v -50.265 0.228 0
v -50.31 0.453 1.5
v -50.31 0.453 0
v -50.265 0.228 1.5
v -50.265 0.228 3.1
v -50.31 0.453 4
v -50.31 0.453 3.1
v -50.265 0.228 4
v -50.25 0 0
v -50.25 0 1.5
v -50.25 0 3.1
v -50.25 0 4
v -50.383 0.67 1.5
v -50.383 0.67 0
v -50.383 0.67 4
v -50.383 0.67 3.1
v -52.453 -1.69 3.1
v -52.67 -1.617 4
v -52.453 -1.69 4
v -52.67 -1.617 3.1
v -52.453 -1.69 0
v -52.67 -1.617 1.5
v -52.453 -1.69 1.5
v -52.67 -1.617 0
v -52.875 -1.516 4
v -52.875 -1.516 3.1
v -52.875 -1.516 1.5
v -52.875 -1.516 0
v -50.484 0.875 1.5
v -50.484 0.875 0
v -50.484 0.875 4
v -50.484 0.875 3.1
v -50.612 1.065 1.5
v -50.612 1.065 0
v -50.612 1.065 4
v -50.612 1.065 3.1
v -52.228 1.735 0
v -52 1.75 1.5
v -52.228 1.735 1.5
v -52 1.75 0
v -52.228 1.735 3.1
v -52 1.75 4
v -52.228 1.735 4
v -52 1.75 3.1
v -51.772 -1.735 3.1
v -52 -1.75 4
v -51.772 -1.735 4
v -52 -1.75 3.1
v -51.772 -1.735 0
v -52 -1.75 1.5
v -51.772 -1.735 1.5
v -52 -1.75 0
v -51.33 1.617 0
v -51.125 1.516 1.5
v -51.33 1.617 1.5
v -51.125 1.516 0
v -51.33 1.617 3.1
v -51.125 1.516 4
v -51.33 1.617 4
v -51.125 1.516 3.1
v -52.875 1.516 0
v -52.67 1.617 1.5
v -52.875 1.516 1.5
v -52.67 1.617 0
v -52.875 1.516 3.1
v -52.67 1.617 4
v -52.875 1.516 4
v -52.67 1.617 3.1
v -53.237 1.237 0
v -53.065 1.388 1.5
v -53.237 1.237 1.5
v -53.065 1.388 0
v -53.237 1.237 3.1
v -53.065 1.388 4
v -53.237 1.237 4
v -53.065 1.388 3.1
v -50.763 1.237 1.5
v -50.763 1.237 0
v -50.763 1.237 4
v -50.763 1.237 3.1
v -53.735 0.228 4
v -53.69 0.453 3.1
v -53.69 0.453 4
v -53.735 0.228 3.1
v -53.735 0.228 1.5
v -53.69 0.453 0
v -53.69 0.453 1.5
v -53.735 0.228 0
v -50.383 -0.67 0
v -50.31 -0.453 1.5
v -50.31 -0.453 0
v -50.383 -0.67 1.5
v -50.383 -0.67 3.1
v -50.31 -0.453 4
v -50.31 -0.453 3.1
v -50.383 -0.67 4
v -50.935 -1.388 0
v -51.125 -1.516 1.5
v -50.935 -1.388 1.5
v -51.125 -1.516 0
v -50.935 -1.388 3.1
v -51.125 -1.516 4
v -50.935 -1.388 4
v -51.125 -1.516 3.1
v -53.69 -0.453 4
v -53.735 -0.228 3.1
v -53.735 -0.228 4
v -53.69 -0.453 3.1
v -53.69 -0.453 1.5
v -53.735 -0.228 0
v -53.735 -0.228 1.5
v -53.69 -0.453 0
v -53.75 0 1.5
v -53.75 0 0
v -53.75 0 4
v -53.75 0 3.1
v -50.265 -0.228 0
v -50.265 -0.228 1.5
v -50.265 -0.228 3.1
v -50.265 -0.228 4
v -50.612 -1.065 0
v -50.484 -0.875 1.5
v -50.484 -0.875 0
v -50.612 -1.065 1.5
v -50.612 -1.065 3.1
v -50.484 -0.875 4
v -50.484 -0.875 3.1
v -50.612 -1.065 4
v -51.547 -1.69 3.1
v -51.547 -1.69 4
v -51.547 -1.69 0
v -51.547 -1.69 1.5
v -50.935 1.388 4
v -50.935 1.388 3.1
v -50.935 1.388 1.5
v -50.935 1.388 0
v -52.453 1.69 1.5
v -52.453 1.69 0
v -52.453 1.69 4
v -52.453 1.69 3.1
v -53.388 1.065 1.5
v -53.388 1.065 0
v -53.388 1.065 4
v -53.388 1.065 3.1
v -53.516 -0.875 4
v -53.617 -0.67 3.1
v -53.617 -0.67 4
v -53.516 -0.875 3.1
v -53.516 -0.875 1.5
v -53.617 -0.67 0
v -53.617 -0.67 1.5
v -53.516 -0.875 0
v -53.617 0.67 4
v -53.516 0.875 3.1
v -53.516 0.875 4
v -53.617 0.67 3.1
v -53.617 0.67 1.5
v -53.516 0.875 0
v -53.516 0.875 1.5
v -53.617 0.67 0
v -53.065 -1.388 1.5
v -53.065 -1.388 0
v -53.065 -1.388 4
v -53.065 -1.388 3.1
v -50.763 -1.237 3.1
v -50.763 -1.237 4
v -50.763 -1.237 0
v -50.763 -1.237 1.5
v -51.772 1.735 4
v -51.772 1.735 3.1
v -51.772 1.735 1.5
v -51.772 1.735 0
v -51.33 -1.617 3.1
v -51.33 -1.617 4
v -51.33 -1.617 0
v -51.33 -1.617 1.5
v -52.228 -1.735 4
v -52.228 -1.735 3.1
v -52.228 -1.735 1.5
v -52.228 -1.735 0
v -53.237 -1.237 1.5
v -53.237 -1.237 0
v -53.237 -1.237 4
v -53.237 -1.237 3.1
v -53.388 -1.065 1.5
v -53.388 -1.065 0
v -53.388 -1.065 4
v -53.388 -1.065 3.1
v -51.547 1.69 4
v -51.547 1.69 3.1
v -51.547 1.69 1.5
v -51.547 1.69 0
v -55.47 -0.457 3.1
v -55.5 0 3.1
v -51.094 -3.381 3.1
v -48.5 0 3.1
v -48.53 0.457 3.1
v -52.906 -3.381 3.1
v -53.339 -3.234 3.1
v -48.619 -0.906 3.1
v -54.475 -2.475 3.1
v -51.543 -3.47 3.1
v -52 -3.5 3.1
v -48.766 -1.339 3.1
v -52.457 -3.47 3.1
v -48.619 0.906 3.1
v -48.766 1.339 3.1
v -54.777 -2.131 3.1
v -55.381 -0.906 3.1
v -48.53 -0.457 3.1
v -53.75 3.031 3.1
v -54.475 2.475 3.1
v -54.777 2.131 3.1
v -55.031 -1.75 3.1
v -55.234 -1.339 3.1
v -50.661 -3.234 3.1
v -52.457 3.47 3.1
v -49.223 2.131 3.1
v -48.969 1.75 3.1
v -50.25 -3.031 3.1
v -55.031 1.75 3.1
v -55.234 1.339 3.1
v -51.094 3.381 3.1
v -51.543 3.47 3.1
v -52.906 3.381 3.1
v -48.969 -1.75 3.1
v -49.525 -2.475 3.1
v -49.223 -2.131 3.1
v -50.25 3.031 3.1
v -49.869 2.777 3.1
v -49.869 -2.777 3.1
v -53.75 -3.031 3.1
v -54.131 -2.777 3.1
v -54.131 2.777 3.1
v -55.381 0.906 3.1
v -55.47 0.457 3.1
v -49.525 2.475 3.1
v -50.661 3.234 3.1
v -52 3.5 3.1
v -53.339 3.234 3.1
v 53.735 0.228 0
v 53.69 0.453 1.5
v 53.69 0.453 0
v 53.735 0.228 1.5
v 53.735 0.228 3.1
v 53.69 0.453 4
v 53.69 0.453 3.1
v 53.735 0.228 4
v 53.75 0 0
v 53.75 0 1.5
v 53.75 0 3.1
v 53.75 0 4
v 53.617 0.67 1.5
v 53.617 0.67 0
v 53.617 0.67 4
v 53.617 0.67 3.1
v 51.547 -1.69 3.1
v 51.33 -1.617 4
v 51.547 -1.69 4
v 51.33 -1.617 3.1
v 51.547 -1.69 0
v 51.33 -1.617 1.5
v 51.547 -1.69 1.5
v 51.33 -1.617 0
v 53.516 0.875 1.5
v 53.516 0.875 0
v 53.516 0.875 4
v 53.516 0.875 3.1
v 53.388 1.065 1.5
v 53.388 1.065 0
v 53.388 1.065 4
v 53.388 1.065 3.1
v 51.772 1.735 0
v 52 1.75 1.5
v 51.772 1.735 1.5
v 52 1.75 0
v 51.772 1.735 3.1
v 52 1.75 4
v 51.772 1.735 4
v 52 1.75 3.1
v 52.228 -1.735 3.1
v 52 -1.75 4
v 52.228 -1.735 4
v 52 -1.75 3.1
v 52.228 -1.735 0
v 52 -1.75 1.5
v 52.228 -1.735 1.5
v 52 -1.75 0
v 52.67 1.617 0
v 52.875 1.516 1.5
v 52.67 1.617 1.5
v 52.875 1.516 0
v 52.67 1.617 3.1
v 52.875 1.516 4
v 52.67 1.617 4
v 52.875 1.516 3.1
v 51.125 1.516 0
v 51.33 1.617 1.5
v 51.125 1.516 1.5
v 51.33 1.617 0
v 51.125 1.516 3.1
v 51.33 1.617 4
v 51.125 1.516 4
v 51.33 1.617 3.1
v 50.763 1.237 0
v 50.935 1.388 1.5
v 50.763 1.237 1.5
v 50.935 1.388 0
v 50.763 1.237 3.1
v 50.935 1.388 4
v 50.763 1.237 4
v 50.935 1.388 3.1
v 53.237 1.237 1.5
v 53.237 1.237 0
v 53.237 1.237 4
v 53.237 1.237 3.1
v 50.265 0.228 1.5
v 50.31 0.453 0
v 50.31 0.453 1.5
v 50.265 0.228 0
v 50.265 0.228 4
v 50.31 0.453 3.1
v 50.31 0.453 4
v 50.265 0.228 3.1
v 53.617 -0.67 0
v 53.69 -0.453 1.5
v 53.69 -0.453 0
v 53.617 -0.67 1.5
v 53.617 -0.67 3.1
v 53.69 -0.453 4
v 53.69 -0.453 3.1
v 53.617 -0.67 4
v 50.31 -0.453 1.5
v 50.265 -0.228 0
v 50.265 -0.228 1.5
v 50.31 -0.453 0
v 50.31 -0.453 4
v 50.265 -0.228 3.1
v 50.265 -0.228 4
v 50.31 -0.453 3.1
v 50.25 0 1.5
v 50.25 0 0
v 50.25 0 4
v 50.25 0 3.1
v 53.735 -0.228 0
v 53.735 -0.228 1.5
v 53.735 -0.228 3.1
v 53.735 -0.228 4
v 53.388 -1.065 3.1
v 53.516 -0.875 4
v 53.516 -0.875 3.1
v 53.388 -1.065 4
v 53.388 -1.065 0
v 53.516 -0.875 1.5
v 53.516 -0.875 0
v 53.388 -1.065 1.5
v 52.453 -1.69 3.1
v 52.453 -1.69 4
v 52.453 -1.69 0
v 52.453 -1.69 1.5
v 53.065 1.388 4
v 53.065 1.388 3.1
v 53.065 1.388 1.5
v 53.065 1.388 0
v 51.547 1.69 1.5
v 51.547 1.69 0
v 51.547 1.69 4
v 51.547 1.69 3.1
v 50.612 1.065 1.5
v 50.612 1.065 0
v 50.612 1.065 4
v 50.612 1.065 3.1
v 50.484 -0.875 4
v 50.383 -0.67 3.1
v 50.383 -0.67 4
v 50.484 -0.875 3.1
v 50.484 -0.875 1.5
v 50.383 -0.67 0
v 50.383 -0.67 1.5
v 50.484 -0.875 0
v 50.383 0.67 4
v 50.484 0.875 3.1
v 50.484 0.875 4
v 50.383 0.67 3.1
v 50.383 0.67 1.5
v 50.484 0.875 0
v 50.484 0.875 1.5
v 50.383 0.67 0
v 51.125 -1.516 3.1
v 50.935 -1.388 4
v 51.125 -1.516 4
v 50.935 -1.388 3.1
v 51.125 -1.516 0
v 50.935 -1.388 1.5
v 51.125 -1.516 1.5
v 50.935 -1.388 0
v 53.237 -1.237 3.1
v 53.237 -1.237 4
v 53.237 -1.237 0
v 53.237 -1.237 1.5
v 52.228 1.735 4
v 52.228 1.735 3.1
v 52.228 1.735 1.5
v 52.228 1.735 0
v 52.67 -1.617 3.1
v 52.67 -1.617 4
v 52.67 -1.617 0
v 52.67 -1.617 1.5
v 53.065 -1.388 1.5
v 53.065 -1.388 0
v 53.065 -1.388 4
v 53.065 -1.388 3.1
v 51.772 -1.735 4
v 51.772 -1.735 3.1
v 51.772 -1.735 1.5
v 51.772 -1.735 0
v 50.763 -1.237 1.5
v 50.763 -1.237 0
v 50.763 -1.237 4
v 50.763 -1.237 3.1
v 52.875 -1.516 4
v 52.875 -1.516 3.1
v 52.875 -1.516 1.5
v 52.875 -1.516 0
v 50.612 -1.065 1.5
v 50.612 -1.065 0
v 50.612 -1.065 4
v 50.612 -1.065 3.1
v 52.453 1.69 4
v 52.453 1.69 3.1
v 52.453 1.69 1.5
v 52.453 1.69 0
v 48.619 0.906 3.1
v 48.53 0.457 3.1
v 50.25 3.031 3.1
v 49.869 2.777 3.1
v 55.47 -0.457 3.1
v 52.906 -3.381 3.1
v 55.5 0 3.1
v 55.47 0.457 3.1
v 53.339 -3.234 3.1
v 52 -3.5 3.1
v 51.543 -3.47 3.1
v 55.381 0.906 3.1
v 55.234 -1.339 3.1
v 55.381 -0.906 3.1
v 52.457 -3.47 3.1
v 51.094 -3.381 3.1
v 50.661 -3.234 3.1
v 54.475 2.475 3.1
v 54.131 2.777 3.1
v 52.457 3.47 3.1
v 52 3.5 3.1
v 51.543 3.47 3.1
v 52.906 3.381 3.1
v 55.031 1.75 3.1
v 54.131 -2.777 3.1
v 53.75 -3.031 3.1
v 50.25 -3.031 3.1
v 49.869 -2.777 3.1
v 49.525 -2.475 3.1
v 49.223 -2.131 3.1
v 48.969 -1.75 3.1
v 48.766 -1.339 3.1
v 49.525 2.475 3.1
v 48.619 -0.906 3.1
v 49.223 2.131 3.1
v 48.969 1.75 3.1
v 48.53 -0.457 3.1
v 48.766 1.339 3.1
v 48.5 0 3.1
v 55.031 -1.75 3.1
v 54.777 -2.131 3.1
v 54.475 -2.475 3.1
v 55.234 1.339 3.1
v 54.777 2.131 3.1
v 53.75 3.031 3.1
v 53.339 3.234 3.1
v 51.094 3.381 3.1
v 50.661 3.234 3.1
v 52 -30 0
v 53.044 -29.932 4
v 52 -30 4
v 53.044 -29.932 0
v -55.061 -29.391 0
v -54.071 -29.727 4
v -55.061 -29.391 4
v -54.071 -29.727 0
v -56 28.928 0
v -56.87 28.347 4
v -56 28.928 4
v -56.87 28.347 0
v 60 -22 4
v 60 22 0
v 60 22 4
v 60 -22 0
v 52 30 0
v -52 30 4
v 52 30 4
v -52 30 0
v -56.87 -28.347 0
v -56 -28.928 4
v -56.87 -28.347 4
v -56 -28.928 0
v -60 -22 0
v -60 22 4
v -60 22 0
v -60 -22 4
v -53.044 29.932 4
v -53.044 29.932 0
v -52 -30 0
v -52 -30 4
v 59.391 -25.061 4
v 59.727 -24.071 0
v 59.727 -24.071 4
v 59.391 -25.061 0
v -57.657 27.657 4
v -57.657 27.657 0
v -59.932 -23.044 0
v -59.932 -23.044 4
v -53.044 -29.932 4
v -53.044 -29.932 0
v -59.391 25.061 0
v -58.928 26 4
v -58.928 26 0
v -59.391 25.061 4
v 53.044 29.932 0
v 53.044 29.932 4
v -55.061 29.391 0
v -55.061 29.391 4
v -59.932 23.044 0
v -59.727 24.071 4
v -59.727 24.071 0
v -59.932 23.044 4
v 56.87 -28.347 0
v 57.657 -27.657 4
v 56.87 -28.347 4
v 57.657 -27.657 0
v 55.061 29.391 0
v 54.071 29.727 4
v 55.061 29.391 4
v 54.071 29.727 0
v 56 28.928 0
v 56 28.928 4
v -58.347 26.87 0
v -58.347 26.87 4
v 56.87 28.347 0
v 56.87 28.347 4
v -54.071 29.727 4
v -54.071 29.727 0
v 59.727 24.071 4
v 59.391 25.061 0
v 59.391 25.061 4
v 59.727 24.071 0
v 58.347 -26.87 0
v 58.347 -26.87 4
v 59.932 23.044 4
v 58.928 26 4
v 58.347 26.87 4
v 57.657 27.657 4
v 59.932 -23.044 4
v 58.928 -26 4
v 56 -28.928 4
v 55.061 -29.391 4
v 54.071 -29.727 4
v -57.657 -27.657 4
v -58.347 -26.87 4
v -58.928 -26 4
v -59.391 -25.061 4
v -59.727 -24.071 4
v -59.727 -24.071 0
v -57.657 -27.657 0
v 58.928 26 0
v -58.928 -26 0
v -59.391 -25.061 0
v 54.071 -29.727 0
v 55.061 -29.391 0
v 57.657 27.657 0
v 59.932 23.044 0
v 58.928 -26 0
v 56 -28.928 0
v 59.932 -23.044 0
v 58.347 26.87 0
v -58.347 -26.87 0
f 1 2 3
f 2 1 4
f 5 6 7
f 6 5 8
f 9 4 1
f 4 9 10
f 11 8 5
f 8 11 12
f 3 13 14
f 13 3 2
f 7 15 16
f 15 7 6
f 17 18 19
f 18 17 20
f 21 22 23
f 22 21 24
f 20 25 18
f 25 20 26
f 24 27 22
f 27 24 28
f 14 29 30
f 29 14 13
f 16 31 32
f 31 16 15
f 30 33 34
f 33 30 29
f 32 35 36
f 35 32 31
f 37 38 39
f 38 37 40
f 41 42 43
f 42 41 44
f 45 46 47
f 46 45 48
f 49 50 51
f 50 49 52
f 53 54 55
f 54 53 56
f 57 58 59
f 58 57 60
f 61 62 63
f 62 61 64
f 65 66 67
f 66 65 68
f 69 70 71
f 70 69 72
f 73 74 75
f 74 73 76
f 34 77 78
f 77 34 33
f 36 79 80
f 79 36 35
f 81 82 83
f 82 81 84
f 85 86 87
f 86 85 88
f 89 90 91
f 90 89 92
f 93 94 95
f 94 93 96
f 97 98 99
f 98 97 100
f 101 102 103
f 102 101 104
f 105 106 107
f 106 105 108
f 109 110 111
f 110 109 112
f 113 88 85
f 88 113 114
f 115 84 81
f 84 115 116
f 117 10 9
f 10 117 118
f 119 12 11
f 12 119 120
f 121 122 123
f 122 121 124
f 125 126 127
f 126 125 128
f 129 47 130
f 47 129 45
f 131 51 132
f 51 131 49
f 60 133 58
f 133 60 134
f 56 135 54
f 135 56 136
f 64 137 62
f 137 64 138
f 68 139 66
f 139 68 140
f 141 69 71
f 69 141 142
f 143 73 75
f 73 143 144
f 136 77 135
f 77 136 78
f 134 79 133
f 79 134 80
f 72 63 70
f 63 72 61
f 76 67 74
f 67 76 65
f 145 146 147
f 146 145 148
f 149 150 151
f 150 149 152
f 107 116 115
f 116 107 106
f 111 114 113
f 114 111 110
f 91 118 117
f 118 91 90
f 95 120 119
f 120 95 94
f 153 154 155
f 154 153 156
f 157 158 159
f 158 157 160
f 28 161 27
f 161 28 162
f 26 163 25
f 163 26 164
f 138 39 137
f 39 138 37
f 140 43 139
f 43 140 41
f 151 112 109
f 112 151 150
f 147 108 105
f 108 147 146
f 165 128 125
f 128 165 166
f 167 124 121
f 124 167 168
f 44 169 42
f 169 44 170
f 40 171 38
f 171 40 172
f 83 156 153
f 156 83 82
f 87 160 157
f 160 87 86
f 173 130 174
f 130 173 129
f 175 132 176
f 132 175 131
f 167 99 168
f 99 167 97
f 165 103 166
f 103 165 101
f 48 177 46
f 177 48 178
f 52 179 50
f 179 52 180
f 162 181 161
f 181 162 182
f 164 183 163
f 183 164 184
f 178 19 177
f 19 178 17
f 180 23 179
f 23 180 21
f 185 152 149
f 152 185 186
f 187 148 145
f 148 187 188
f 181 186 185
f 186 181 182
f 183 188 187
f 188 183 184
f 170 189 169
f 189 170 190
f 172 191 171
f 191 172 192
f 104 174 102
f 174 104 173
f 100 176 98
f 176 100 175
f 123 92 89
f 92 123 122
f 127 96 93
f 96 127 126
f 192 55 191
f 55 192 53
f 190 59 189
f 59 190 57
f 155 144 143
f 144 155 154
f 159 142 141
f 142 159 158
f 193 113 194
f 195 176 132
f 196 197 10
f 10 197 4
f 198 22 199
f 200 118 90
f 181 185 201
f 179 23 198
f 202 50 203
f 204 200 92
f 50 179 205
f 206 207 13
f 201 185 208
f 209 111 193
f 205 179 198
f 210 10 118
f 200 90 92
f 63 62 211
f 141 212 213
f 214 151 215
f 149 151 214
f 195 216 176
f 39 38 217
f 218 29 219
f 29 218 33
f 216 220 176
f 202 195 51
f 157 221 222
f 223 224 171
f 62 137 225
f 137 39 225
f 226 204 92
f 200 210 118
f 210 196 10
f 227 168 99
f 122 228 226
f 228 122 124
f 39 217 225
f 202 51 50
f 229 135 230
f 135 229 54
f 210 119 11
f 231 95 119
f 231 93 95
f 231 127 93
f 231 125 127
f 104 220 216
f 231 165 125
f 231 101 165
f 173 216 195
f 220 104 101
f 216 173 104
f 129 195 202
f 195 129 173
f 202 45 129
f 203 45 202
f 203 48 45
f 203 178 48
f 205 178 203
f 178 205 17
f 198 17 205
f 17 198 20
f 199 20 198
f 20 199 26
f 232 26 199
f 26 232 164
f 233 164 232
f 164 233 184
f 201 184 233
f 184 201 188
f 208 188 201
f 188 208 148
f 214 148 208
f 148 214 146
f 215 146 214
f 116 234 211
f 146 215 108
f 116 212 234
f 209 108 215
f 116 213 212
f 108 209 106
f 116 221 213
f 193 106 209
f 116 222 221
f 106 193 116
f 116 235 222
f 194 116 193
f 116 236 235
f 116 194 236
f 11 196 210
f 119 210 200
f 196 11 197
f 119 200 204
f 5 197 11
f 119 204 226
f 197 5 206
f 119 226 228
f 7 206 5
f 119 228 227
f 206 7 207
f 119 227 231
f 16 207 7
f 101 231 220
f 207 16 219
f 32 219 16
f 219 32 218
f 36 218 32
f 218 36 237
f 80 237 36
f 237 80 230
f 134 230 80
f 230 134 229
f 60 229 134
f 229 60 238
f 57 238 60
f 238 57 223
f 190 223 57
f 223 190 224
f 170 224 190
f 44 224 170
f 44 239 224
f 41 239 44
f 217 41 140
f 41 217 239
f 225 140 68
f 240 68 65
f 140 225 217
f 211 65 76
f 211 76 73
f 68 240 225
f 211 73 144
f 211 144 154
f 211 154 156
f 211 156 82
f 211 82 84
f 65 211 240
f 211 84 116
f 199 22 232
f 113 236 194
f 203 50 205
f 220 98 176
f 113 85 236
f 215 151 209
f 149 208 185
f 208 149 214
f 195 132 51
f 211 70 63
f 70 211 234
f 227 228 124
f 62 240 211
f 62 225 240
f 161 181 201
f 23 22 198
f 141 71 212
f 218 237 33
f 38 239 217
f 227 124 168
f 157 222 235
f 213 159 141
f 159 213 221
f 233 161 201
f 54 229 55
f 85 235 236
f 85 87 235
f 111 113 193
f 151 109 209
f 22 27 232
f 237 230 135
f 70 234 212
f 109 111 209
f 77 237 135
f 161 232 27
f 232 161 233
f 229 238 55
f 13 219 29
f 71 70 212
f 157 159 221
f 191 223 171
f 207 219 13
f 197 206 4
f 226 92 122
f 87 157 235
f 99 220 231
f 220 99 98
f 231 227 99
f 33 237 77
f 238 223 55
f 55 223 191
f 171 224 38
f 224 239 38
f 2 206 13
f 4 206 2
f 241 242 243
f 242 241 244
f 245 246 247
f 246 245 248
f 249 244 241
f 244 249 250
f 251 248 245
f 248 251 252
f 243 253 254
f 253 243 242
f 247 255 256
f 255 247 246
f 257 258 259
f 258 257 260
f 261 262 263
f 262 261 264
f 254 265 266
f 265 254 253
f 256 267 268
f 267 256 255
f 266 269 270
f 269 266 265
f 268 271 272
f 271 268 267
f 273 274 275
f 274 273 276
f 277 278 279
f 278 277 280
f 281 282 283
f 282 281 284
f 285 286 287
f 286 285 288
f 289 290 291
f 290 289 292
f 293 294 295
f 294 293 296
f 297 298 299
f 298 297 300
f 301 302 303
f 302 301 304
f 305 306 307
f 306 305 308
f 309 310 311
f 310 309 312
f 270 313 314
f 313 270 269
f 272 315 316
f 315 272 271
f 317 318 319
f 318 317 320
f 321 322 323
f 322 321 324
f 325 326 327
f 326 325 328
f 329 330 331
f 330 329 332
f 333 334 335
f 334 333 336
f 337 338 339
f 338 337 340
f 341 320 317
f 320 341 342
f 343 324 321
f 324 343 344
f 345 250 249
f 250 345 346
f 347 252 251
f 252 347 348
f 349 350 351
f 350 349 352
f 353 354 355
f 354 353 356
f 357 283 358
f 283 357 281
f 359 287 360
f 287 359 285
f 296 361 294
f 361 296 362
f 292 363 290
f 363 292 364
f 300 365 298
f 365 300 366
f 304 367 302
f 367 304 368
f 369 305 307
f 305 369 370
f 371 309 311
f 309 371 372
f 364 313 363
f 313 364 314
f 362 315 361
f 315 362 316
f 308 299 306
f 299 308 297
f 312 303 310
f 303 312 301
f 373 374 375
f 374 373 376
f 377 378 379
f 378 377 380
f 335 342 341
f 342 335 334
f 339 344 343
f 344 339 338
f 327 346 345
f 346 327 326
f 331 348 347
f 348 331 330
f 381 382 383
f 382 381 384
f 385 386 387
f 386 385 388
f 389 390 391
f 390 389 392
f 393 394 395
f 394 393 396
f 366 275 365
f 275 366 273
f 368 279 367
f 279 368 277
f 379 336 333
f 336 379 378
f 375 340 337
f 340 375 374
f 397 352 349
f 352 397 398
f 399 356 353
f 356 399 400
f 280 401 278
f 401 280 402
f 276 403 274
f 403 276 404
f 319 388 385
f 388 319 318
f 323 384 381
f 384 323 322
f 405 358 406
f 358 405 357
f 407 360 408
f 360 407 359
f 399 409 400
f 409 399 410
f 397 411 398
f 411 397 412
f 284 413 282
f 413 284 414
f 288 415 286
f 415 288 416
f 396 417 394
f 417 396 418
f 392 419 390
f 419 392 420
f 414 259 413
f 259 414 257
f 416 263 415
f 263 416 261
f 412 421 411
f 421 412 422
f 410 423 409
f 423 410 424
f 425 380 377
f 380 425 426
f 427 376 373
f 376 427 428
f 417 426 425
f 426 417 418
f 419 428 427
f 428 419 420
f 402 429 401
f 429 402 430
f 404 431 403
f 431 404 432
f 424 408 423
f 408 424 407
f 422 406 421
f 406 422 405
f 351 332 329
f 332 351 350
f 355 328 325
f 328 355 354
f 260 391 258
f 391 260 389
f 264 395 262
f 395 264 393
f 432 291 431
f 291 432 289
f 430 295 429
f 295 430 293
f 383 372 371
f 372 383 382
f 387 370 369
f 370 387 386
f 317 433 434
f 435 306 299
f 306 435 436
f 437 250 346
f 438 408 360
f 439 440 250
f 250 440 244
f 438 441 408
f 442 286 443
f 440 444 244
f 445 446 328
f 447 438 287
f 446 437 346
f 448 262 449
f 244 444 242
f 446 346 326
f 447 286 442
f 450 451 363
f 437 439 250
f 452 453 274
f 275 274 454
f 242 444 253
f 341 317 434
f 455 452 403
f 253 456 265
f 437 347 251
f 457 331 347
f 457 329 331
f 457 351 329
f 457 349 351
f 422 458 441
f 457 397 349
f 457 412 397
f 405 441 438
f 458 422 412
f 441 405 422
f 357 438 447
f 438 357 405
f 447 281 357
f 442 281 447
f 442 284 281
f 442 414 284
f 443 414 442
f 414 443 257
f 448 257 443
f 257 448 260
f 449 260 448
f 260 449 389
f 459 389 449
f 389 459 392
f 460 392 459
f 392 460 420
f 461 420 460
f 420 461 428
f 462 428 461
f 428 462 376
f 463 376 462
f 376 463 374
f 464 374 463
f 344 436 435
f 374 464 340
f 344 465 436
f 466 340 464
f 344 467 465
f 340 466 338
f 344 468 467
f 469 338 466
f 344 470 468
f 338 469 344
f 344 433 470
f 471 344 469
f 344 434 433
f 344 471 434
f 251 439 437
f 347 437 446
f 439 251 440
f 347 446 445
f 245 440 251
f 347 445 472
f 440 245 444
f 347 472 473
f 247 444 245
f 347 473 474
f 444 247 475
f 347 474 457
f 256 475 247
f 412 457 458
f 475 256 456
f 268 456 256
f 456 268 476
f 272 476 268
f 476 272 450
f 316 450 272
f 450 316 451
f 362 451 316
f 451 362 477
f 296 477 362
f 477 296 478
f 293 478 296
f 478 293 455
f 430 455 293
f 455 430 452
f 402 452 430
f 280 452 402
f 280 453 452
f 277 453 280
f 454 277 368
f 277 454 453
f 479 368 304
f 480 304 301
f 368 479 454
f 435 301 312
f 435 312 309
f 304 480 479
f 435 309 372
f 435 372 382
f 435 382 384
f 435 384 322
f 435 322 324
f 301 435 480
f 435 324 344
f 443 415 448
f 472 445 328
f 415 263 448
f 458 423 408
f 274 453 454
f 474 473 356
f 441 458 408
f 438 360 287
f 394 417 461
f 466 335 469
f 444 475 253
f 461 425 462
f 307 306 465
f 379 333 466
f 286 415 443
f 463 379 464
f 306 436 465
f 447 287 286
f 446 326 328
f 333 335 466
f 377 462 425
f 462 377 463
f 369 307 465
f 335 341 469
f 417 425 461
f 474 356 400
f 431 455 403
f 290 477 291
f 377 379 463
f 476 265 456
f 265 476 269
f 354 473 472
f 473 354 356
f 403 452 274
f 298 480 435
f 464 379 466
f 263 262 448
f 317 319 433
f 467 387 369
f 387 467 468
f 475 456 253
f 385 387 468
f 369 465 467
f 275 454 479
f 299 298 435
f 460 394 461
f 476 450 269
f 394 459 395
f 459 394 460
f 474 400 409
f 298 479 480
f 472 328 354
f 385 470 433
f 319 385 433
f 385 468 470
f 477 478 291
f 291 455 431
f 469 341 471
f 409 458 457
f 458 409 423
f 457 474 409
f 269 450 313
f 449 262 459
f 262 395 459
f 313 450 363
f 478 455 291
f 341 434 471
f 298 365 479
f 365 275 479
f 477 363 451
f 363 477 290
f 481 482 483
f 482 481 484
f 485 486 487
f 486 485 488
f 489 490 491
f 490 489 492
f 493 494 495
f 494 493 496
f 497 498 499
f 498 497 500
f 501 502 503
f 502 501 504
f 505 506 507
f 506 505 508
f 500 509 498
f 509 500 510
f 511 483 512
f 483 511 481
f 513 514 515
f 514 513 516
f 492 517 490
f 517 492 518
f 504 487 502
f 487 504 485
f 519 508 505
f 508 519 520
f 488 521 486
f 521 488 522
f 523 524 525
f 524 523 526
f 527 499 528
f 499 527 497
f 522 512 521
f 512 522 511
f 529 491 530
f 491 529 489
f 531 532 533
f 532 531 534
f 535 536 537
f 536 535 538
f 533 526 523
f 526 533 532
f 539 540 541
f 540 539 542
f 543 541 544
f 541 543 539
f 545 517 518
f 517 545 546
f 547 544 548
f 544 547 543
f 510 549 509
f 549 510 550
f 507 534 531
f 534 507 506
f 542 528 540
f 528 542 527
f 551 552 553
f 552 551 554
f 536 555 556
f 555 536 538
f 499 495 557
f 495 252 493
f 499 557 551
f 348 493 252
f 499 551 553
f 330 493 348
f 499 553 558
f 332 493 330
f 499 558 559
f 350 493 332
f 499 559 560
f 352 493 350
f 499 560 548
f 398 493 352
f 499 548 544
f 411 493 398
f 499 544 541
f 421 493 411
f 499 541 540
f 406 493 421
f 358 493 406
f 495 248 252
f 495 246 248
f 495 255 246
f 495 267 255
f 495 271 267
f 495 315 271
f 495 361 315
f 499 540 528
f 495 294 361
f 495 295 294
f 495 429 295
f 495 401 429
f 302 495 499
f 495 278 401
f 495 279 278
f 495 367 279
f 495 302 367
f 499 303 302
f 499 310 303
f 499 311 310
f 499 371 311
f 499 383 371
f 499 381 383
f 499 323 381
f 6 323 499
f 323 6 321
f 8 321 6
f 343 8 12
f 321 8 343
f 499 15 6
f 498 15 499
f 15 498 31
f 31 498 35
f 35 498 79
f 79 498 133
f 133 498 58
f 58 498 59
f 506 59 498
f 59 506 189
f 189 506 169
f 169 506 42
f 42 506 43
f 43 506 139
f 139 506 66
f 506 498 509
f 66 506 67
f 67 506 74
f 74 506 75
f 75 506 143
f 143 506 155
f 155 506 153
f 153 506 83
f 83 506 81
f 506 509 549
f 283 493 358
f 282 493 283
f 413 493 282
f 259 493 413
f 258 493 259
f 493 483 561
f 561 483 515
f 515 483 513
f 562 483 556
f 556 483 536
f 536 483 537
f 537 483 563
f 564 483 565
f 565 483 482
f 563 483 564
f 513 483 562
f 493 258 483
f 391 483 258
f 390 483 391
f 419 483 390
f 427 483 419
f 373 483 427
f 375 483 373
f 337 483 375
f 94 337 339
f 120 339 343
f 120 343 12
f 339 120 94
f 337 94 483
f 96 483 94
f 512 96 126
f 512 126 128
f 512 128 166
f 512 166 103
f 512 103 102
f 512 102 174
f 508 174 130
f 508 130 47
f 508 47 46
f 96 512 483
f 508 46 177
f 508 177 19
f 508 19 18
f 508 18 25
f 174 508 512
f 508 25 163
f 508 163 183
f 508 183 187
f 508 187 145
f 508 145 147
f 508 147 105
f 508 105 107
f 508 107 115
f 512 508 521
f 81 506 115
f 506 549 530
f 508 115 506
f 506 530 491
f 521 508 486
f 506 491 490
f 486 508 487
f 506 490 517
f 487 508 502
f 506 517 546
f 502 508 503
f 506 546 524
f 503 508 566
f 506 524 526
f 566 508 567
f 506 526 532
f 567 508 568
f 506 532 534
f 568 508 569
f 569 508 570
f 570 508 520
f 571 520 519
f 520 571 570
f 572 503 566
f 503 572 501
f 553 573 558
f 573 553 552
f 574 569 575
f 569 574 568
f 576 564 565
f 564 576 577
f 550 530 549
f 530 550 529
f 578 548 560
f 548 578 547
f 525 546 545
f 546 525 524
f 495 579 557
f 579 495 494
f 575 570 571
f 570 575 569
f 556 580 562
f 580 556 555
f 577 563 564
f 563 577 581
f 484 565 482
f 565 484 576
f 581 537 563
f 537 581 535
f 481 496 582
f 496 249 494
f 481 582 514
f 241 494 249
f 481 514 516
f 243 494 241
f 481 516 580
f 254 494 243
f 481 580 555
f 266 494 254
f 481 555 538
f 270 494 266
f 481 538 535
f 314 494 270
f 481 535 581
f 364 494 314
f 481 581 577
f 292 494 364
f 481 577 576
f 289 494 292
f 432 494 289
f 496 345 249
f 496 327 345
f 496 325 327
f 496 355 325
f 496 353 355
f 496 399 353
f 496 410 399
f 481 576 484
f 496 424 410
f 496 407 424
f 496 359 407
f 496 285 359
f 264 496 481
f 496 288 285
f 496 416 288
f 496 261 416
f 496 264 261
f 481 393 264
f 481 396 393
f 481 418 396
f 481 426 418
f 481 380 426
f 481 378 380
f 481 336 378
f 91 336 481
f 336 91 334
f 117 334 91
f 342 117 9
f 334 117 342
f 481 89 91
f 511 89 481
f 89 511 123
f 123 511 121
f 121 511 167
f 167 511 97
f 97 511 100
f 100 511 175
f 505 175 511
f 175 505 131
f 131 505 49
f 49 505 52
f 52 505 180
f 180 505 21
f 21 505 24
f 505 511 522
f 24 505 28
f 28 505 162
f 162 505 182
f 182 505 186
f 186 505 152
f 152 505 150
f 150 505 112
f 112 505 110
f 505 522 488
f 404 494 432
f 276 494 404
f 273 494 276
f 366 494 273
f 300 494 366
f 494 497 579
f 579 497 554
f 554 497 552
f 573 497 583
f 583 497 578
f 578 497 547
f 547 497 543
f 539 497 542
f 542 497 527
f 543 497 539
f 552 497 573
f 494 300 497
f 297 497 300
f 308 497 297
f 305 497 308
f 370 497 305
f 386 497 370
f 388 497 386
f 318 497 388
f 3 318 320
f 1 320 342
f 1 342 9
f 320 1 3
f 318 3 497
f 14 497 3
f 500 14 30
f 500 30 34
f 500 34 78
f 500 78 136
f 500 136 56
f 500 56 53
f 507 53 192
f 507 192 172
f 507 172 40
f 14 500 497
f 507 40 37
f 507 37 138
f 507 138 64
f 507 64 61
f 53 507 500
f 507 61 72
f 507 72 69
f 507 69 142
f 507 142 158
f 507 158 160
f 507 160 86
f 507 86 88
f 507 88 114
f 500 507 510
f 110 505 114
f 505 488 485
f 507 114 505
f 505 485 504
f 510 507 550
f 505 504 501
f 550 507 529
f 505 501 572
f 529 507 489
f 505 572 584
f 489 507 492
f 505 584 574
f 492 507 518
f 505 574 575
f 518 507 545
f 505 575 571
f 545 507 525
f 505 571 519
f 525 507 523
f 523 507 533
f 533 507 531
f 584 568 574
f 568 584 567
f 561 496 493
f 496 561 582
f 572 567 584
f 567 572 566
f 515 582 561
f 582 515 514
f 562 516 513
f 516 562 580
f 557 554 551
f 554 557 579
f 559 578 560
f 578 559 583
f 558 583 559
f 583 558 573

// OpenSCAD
// Plaquinha de porta — modelo próprio do Multiferramenta 3D
// Partes: "placa" e "texto"
texto = "101"; linha2 = "Escritório"; fonte = "Poppins:style=Bold";
largura = 120; altura = 60; esp = 4; relevo = 1.2; raio = 8; borda = 2.5; furos = true;
parte = "placa";
$fn = 48;

module contorno(r = 0) offset(r = raio) offset(delta = -raio) square([largura - 2 * r, altura - 2 * r], center = true);
tem2 = len(linha2) > 0;
module textos() {
  translate([0, tem2 ? altura * 0.1 : 0]) resize([0, altura * (tem2 ? 0.42 : 0.55)], auto = true) text(texto, font = fonte, size = 10, halign = "center", valign = "center");
  if (tem2) translate([0, -altura * 0.26]) resize([min(largura - 30, len(linha2) * altura * 0.1), 0], auto = true) text(linha2, font = fonte, size = 10, halign = "center", valign = "center");
  difference() { contorno(); offset(delta = -borda) contorno(); }          // moldura em relevo
}
if (parte == "placa") difference() {
  linear_extrude(esp) contorno();
  if (furos) for (x = [-1, 1]) translate([x * (largura / 2 - 8), 0, -1]) { cylinder(d = 3.5, h = esp + 2); translate([0, 0, esp - 1.5]) cylinder(d1 = 3.5, d2 = 7, h = 1.6); }
}
else if (parte == "texto") translate([0, 0, esp]) linear_extrude(relevo) textos();
